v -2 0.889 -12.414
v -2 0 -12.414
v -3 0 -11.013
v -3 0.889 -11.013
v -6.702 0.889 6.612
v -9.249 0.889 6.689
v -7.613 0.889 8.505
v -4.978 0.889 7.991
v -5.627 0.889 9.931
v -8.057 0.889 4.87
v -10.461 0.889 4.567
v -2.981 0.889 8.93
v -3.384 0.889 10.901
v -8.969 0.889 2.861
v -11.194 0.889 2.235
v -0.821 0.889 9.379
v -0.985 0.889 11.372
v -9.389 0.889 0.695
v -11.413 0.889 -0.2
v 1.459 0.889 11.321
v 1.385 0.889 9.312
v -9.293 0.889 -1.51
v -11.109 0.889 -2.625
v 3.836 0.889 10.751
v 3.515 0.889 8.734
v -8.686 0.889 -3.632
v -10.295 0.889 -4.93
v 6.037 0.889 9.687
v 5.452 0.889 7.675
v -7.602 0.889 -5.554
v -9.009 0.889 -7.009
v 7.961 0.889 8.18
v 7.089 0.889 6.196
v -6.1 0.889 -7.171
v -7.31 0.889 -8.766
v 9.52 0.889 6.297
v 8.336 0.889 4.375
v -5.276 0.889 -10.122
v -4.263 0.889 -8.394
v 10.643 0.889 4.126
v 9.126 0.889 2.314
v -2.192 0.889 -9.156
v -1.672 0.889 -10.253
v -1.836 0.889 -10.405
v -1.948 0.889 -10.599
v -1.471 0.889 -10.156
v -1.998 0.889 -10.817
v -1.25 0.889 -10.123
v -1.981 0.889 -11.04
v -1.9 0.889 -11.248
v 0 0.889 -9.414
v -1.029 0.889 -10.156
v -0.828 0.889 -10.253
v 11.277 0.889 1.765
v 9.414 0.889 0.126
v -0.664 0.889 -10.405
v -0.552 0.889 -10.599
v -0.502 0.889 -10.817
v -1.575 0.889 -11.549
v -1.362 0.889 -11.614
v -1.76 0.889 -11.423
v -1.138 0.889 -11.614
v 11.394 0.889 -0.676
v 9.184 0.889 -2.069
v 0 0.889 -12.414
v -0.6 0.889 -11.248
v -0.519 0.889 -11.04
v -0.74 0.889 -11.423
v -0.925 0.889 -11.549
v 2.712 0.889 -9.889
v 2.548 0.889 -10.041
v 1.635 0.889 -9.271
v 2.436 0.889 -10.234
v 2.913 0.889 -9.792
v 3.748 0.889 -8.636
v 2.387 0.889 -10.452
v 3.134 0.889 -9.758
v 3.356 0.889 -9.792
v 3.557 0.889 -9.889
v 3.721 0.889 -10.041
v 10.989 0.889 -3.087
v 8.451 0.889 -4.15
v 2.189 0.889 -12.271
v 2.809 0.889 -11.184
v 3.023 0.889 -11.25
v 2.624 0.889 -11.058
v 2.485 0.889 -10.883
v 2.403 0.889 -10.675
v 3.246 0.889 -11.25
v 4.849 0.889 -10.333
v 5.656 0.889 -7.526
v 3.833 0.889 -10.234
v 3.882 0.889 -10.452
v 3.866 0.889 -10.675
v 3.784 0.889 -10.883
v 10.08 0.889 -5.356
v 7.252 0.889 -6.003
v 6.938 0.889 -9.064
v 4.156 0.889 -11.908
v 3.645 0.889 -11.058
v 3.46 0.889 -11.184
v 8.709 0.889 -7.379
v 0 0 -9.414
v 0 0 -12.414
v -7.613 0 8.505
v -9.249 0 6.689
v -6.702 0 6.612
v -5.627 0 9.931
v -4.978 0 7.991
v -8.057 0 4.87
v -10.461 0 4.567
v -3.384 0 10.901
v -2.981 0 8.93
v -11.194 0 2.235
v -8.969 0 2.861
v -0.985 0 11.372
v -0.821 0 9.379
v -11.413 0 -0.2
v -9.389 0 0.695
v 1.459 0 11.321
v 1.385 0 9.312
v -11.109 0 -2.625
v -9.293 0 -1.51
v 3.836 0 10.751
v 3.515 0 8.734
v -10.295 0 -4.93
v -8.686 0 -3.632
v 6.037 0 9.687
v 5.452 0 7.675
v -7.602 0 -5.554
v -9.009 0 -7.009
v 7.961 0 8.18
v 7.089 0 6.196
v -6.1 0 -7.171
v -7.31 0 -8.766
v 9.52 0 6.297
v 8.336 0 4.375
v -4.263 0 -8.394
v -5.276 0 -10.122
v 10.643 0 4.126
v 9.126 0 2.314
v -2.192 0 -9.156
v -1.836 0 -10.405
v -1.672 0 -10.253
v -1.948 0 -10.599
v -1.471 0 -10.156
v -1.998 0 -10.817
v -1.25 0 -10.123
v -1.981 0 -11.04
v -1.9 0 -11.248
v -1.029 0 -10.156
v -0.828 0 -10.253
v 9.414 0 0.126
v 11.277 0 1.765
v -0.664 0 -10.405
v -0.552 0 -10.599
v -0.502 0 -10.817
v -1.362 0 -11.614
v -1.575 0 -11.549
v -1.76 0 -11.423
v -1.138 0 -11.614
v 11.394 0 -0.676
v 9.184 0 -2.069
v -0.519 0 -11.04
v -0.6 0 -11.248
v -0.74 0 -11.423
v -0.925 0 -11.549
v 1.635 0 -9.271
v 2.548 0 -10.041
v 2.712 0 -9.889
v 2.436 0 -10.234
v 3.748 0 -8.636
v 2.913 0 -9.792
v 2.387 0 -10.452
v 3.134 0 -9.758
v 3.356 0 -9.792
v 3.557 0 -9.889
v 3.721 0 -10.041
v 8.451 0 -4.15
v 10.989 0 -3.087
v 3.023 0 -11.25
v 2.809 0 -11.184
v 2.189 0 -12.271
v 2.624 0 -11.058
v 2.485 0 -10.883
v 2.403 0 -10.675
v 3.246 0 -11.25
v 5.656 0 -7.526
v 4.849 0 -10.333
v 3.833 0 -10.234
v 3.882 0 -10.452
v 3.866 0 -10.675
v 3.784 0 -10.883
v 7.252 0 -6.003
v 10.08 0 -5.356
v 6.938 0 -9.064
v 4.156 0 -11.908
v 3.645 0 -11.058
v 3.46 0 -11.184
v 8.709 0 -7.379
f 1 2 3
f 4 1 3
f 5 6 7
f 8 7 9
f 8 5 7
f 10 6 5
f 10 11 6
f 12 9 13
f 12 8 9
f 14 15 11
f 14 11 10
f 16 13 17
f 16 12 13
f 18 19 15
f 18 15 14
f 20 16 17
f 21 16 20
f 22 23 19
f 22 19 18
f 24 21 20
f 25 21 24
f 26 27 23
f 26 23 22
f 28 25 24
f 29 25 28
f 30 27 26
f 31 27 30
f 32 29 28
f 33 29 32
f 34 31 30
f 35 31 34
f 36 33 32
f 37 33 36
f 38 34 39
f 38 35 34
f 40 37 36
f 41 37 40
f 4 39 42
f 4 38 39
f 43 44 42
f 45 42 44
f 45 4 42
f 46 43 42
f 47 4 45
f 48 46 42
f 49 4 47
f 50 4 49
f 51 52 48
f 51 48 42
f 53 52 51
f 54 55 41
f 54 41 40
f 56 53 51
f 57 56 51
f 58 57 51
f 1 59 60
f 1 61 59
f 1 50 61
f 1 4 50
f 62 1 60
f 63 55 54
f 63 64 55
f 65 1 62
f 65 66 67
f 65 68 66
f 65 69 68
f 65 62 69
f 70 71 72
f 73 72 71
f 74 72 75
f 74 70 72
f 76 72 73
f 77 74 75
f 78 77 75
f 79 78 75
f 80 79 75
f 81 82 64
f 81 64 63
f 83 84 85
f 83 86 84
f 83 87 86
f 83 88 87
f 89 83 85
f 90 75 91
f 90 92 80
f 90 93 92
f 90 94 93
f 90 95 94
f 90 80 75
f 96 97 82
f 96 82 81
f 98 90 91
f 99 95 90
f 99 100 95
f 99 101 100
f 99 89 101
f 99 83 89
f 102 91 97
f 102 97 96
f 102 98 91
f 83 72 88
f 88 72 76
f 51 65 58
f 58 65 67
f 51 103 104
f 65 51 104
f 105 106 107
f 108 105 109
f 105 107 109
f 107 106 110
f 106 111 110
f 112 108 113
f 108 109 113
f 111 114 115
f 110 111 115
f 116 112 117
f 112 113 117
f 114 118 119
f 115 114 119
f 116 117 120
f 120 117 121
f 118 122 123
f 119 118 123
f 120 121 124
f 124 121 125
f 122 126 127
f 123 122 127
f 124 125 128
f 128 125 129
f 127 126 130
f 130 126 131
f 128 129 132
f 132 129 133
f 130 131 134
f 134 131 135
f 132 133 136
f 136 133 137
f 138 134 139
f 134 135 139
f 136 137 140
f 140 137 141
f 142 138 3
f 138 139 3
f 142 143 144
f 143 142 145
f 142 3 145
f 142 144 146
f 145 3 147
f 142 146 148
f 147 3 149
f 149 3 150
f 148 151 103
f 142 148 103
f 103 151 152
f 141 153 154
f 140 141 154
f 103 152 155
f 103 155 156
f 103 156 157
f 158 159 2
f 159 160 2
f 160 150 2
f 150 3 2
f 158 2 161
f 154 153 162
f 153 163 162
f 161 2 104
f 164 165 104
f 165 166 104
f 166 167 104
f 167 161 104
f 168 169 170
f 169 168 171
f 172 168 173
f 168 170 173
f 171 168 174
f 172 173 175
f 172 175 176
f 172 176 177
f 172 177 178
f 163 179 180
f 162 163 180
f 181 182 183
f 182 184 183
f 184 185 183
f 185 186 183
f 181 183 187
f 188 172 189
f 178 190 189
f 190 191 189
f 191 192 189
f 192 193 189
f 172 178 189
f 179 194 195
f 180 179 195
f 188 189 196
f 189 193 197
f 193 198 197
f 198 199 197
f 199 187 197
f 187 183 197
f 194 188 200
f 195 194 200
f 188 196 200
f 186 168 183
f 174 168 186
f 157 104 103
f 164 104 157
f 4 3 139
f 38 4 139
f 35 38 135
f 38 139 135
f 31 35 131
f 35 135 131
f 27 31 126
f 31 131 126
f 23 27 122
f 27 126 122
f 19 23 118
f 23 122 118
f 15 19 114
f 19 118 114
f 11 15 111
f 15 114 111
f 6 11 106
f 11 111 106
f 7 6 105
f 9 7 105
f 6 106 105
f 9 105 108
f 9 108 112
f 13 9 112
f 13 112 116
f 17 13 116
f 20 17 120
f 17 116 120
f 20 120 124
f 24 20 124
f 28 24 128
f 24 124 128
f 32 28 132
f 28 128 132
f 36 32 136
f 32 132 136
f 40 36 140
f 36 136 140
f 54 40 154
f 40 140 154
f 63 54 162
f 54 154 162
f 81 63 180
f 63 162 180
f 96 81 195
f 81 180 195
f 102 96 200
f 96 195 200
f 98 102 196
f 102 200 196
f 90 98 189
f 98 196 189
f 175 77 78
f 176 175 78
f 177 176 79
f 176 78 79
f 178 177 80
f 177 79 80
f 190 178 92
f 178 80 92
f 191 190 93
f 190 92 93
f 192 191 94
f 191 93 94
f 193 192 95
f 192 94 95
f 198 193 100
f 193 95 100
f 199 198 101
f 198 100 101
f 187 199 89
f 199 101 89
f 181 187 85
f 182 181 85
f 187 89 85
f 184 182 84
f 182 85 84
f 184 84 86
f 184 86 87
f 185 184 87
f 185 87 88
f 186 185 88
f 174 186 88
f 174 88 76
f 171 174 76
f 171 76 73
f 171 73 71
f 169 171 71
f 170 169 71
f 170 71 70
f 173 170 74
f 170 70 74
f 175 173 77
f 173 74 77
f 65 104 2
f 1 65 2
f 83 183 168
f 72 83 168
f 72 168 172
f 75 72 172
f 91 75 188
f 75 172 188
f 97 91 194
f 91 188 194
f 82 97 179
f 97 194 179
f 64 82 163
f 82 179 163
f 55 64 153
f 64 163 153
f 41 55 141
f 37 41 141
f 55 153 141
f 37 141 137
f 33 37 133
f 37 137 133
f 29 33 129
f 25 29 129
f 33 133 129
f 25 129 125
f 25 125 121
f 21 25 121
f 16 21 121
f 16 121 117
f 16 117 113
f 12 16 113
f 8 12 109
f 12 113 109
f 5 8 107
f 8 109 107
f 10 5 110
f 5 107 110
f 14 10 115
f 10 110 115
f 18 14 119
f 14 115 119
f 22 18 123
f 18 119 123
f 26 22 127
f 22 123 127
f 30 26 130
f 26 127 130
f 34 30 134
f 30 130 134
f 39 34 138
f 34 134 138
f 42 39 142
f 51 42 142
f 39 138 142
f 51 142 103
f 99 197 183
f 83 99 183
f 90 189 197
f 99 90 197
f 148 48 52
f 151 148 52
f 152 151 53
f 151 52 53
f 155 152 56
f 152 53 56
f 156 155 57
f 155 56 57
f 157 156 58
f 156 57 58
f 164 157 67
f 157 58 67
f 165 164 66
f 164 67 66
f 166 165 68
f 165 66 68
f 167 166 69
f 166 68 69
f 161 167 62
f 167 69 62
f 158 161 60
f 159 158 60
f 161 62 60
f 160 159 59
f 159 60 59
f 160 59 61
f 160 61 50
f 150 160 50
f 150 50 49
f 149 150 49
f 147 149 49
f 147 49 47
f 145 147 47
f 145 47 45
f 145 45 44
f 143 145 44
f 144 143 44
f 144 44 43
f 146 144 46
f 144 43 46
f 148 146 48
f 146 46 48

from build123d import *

# Parameters (mm, degrees)
BOSS_EXTRUDE1_DEPTH = 0.889
SKETCH4_R           = 0.75
CUT_EXTRUDE2_DEPTH  = 0.889


with BuildPart() as part:
    # Sketch1 → Boss-Extrude1 (new body)
    with BuildSketch(Plane(origin=(0, 0, 0), x_dir=(1, 0, 0), z_dir=(0, 1, 0))):
        with BuildLine():
            Line((0, 12.414484685), (-2, 12.414484685))
            Line((-2, 12.414484685), (-3, 11.013194842))
            ThreePointArc((-3, 11.013194842), (-0.984968358, -11.371908281), (4.848914718, 10.333367635))
            Line((4.848914718, 10.333367635), (4.155731478, 11.908137913))
            Line((4.155731478, 11.908137913), (2.189008602, 12.271457509))
            Line((2.189008602, 12.271457509), (1.634808109, 9.271457509))
            ThreePointArc((1.634808109, 9.271457509), (-0.820526405, -9.378659729), (0, 9.414484685))
            Line((0, 9.414484685), (0, 12.414484685))
        make_face()
    extrude(amount=BOSS_EXTRUDE1_DEPTH)

    # Sketch4 → Cut-Extrude2 (cut)
    with BuildSketch(Plane(origin=(0, 0.889, 0), x_dir=(1, 0, 0), z_dir=(0, 1, 0))):
        with Locations(Location((-1.25, 10.872808275, 0), (0, 0, 270))):
            Circle(SKETCH4_R)
        with Locations(Location((3.134471061, 10.508444008, 0), (0, 0, 270))):
            Circle(SKETCH4_R)
    extrude(amount=-CUT_EXTRUDE2_DEPTH, mode=Mode.SUBTRACT)


solid = part.part
